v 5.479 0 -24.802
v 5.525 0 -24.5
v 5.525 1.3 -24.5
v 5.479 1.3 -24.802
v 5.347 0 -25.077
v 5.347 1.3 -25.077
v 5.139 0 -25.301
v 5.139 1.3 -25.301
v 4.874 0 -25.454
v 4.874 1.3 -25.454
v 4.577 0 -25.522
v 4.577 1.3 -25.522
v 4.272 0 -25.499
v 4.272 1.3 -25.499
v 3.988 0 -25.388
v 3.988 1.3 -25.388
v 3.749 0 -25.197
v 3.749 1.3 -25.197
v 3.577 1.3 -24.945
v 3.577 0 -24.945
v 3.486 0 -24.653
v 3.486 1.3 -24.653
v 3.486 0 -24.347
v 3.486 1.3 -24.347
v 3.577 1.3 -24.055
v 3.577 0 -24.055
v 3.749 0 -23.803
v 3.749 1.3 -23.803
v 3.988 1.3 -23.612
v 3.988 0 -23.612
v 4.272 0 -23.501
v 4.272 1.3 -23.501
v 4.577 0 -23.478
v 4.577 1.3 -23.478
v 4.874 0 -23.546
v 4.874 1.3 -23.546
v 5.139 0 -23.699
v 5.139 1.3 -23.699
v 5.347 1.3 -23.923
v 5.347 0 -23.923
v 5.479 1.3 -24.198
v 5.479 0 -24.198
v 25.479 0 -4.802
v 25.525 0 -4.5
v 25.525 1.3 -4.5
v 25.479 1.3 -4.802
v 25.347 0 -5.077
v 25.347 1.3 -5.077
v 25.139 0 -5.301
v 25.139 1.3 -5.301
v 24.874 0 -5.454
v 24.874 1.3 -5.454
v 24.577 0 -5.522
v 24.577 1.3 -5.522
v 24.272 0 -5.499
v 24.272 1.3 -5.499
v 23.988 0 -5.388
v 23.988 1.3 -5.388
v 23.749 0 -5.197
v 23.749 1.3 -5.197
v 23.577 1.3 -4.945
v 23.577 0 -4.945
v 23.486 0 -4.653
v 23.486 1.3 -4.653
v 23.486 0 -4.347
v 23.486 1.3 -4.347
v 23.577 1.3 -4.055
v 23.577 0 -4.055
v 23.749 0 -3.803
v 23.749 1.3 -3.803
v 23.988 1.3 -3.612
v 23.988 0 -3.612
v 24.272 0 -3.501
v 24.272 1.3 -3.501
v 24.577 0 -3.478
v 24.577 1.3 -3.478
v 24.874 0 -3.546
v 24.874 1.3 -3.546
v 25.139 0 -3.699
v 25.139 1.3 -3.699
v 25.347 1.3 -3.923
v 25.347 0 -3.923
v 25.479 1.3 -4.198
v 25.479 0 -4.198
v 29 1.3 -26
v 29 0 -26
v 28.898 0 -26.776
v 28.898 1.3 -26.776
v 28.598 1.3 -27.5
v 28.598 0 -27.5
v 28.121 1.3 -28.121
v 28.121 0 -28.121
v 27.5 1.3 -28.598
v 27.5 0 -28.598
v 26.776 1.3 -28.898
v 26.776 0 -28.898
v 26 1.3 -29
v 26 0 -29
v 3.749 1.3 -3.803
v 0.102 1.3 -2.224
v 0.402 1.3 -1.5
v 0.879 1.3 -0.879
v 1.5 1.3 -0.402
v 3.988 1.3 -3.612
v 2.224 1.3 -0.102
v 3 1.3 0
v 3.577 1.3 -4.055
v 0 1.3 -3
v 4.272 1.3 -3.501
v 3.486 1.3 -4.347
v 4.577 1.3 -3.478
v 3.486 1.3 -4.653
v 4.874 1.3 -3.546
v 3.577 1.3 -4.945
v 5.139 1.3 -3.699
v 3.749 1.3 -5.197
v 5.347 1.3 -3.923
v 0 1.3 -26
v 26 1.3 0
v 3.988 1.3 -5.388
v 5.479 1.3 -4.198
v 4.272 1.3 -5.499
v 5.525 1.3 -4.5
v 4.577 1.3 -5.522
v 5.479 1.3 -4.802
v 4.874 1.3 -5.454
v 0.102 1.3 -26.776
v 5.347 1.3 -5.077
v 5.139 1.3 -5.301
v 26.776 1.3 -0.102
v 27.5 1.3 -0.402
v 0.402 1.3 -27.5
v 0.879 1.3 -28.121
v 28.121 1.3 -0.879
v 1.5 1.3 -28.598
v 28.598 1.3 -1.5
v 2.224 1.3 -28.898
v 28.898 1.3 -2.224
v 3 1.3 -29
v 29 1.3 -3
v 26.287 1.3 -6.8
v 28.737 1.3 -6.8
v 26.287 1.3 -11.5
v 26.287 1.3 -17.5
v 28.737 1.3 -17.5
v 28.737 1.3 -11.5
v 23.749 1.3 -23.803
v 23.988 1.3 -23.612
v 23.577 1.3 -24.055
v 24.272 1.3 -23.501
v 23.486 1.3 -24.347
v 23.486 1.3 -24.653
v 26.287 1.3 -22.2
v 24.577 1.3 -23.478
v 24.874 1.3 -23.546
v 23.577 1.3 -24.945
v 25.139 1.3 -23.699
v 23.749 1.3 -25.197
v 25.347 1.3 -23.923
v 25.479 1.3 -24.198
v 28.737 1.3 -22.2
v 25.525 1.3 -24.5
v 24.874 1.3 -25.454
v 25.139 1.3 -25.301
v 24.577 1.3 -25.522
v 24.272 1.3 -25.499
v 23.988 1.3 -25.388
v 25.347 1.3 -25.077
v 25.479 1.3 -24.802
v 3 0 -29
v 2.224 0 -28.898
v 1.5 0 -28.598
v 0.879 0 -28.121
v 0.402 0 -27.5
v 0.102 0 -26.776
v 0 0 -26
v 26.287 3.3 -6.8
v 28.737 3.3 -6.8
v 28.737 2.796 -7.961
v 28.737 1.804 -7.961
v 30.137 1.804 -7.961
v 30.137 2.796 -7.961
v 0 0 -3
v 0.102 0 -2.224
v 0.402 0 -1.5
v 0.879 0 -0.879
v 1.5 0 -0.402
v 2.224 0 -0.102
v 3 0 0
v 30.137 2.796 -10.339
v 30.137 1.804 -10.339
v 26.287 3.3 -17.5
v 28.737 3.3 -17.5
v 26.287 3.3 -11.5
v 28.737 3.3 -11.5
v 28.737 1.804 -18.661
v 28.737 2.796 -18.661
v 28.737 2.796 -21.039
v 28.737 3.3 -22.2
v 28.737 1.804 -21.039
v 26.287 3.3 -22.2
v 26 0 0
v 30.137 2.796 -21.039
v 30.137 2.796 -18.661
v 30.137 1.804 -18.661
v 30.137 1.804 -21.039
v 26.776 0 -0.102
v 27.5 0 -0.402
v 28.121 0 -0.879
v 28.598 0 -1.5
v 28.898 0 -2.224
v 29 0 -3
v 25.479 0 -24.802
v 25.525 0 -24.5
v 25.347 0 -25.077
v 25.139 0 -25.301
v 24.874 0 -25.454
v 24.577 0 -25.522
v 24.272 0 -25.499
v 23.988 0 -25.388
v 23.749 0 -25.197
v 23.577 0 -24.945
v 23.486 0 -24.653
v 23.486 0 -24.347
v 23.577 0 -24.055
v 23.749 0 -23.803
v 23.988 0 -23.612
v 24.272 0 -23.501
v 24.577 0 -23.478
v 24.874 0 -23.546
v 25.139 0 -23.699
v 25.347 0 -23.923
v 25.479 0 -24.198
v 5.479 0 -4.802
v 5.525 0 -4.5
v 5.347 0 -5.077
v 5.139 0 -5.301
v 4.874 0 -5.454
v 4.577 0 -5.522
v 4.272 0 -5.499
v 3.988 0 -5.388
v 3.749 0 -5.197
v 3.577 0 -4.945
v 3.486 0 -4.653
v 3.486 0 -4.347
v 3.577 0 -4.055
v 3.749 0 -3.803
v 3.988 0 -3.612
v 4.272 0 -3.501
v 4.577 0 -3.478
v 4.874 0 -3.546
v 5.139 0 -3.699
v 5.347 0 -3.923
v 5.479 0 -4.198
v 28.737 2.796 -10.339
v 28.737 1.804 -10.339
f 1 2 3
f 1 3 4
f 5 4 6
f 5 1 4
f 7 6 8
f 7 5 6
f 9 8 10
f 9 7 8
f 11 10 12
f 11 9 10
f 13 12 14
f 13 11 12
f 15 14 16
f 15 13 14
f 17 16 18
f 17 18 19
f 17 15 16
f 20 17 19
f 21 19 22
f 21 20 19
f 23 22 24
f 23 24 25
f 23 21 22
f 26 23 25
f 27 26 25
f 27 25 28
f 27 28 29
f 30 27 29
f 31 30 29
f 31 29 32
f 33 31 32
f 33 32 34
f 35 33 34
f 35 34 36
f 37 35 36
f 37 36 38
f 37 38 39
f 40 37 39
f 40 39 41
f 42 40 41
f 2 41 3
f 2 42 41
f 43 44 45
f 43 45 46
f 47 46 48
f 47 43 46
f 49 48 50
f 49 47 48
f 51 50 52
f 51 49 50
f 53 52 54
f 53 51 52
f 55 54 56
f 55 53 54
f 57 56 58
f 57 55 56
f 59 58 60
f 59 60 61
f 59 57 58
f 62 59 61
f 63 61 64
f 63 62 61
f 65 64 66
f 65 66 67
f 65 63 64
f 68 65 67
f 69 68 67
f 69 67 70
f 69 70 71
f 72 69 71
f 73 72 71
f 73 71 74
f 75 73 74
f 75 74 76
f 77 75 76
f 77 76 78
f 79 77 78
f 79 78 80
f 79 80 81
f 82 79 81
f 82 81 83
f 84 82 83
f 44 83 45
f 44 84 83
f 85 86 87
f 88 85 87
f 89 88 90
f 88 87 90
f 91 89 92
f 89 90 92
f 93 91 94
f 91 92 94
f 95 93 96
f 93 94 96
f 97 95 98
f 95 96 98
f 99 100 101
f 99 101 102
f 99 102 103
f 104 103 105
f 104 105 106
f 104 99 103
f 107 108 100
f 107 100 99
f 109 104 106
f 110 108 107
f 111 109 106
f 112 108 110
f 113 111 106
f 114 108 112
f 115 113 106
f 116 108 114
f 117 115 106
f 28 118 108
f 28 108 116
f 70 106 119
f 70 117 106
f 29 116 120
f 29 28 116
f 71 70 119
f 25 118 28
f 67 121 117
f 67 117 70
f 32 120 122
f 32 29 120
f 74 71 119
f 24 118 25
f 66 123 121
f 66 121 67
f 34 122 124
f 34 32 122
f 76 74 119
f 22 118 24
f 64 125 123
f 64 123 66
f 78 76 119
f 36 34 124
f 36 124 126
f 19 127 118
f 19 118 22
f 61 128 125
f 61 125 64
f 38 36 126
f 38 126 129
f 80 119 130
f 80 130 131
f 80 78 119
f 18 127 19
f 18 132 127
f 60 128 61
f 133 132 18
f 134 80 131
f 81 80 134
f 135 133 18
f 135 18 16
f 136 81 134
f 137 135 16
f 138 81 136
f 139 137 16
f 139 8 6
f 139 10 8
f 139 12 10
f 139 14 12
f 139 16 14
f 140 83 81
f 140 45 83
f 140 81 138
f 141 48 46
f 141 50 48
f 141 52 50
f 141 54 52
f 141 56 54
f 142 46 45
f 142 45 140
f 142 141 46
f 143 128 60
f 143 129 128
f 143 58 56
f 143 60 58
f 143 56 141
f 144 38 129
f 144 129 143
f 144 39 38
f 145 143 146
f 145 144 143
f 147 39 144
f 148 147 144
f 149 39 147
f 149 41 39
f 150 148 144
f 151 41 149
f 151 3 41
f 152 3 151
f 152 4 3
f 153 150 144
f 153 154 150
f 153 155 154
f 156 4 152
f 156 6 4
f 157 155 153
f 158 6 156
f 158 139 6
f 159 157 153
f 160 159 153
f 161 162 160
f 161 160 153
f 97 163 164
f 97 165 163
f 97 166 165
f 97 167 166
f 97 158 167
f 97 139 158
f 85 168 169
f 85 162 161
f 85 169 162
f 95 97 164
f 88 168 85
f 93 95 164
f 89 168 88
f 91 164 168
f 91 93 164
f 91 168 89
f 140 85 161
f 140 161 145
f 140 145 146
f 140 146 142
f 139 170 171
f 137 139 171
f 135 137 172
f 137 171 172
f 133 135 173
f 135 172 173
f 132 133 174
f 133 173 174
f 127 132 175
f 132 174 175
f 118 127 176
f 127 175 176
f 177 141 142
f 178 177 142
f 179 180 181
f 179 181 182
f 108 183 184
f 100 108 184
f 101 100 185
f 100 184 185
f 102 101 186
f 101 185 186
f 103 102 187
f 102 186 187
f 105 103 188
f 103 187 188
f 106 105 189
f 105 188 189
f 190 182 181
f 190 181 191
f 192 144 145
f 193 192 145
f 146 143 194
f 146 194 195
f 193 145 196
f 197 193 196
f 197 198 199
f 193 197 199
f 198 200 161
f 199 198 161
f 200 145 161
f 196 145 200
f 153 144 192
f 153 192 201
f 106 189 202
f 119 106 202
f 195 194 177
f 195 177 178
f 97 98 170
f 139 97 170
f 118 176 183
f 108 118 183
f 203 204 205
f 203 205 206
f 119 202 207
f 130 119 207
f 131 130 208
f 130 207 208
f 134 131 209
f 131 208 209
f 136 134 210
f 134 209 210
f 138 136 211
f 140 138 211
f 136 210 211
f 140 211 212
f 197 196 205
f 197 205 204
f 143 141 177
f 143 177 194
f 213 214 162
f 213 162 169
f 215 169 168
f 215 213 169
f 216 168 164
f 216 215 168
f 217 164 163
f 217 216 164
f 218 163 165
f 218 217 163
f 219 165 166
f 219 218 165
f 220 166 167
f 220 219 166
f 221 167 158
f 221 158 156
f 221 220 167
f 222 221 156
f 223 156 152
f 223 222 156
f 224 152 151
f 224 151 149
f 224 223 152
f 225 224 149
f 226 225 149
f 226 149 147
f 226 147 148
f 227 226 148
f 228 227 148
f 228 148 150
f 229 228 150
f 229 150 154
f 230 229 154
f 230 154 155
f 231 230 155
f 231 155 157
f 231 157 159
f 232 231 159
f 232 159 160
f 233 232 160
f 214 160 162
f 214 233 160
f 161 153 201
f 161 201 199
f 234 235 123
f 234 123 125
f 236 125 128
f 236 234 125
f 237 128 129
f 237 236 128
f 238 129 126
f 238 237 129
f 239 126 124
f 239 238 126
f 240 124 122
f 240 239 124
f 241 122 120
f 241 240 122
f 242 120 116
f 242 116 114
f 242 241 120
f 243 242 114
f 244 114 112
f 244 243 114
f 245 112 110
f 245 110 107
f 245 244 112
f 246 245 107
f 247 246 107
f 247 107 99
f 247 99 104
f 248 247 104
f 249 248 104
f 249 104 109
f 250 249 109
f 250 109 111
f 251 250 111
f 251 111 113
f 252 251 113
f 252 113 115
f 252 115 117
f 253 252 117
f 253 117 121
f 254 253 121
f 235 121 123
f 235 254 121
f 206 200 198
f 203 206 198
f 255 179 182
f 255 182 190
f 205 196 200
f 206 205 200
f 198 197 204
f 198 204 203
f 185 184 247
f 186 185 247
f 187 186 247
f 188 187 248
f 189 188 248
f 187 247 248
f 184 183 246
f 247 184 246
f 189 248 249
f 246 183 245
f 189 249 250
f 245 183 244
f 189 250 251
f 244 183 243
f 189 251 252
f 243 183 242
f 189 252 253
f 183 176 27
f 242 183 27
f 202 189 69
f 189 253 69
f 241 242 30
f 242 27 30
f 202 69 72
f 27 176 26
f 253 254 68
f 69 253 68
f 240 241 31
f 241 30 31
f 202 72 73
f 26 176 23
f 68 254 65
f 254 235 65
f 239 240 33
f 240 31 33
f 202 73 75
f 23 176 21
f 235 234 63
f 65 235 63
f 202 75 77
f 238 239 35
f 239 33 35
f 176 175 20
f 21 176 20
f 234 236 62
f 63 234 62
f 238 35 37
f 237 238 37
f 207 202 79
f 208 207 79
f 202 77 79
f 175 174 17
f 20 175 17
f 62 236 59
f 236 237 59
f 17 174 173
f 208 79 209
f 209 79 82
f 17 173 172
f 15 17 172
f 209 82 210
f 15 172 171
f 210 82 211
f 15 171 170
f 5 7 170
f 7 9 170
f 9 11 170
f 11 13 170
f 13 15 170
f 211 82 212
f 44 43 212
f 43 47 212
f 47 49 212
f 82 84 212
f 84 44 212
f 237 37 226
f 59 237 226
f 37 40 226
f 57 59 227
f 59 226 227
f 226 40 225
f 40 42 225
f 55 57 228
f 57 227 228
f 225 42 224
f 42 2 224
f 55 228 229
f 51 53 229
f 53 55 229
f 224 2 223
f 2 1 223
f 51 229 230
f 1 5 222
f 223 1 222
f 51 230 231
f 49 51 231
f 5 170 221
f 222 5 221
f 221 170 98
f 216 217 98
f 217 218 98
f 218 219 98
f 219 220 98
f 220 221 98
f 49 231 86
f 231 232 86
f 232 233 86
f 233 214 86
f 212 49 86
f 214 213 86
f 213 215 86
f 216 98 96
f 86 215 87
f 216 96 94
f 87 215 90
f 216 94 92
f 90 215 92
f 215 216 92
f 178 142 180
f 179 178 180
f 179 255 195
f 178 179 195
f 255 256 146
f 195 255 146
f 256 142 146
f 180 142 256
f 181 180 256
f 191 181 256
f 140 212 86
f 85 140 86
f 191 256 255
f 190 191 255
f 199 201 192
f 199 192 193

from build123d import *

# Parameters (mm, degrees)
SKETCH1_R           = 1.025
BOSS_EXTRUDE1_DEPTH = 1.3
SKETCH2_W           = 2.45
SKETCH2_H           = 4.7
BOSS_EXTRUDE2_DEPTH = 2
SKETCH3_W           = 2.378127828
SKETCH3_H           = 0.99144163
BOSS_EXTRUDE3_DEPTH = 1.4


with BuildPart() as part:
    # Sketch1 → Boss-Extrude1 (new body)
    with BuildSketch(Plane(origin=(0, 0, 0), x_dir=(1, 0, 0), z_dir=(0, 1, 0))):
        with BuildLine():
            Line((3, 0), (26, 0))
            ThreePointArc((26, 0), (28.121320344, 0.878679656), (29, 3))
            Line((29, 3), (29, 26))
            ThreePointArc((29, 26), (28.121320344, 28.121320344), (26, 29))
            Line((26, 29), (3, 29))
            ThreePointArc((3, 29), (0.878679656, 28.121320344), (0, 26))
            Line((0, 26), (0, 3))
            ThreePointArc((0, 3), (0.878679656, 0.878679656), (3, 0))
        make_face()
        with Locations((4.5, 24.5)):
            Circle(SKETCH1_R, mode=Mode.SUBTRACT)
        with Locations((24.5, 24.5)):
            Circle(SKETCH1_R, mode=Mode.SUBTRACT)
        with Locations((24.5, 4.5)):
            Circle(SKETCH1_R, mode=Mode.SUBTRACT)
        with Locations((4.5, 4.5)):
            Circle(SKETCH1_R, mode=Mode.SUBTRACT)
    extrude(amount=BOSS_EXTRUDE1_DEPTH)

    # Sketch2 → Boss-Extrude2 (add)
    with BuildSketch(Plane(origin=(0, 1.3, 0), x_dir=(1, 0, 0), z_dir=(0, 1, 0))):
        with Locations((27.511966954, 19.85)):
            Rectangle(SKETCH2_W, SKETCH2_H)
        with Locations((27.511966954, 9.15)):
            Rectangle(SKETCH2_W, SKETCH2_H)
    extrude(amount=BOSS_EXTRUDE2_DEPTH)

    # Sketch3 → Boss-Extrude3 (add)
    with BuildSketch(Plane(origin=(28.736966954, 0, 0), x_dir=(0, 0, -1), z_dir=(1, 0, 0))):
        with Locations((9.15, 2.3)):
            Rectangle(SKETCH3_W, SKETCH3_H)
        with Locations((19.85, 2.3)):
            Rectangle(SKETCH3_W, SKETCH3_H)
    extrude(amount=BOSS_EXTRUDE3_DEPTH)


solid = part.part
